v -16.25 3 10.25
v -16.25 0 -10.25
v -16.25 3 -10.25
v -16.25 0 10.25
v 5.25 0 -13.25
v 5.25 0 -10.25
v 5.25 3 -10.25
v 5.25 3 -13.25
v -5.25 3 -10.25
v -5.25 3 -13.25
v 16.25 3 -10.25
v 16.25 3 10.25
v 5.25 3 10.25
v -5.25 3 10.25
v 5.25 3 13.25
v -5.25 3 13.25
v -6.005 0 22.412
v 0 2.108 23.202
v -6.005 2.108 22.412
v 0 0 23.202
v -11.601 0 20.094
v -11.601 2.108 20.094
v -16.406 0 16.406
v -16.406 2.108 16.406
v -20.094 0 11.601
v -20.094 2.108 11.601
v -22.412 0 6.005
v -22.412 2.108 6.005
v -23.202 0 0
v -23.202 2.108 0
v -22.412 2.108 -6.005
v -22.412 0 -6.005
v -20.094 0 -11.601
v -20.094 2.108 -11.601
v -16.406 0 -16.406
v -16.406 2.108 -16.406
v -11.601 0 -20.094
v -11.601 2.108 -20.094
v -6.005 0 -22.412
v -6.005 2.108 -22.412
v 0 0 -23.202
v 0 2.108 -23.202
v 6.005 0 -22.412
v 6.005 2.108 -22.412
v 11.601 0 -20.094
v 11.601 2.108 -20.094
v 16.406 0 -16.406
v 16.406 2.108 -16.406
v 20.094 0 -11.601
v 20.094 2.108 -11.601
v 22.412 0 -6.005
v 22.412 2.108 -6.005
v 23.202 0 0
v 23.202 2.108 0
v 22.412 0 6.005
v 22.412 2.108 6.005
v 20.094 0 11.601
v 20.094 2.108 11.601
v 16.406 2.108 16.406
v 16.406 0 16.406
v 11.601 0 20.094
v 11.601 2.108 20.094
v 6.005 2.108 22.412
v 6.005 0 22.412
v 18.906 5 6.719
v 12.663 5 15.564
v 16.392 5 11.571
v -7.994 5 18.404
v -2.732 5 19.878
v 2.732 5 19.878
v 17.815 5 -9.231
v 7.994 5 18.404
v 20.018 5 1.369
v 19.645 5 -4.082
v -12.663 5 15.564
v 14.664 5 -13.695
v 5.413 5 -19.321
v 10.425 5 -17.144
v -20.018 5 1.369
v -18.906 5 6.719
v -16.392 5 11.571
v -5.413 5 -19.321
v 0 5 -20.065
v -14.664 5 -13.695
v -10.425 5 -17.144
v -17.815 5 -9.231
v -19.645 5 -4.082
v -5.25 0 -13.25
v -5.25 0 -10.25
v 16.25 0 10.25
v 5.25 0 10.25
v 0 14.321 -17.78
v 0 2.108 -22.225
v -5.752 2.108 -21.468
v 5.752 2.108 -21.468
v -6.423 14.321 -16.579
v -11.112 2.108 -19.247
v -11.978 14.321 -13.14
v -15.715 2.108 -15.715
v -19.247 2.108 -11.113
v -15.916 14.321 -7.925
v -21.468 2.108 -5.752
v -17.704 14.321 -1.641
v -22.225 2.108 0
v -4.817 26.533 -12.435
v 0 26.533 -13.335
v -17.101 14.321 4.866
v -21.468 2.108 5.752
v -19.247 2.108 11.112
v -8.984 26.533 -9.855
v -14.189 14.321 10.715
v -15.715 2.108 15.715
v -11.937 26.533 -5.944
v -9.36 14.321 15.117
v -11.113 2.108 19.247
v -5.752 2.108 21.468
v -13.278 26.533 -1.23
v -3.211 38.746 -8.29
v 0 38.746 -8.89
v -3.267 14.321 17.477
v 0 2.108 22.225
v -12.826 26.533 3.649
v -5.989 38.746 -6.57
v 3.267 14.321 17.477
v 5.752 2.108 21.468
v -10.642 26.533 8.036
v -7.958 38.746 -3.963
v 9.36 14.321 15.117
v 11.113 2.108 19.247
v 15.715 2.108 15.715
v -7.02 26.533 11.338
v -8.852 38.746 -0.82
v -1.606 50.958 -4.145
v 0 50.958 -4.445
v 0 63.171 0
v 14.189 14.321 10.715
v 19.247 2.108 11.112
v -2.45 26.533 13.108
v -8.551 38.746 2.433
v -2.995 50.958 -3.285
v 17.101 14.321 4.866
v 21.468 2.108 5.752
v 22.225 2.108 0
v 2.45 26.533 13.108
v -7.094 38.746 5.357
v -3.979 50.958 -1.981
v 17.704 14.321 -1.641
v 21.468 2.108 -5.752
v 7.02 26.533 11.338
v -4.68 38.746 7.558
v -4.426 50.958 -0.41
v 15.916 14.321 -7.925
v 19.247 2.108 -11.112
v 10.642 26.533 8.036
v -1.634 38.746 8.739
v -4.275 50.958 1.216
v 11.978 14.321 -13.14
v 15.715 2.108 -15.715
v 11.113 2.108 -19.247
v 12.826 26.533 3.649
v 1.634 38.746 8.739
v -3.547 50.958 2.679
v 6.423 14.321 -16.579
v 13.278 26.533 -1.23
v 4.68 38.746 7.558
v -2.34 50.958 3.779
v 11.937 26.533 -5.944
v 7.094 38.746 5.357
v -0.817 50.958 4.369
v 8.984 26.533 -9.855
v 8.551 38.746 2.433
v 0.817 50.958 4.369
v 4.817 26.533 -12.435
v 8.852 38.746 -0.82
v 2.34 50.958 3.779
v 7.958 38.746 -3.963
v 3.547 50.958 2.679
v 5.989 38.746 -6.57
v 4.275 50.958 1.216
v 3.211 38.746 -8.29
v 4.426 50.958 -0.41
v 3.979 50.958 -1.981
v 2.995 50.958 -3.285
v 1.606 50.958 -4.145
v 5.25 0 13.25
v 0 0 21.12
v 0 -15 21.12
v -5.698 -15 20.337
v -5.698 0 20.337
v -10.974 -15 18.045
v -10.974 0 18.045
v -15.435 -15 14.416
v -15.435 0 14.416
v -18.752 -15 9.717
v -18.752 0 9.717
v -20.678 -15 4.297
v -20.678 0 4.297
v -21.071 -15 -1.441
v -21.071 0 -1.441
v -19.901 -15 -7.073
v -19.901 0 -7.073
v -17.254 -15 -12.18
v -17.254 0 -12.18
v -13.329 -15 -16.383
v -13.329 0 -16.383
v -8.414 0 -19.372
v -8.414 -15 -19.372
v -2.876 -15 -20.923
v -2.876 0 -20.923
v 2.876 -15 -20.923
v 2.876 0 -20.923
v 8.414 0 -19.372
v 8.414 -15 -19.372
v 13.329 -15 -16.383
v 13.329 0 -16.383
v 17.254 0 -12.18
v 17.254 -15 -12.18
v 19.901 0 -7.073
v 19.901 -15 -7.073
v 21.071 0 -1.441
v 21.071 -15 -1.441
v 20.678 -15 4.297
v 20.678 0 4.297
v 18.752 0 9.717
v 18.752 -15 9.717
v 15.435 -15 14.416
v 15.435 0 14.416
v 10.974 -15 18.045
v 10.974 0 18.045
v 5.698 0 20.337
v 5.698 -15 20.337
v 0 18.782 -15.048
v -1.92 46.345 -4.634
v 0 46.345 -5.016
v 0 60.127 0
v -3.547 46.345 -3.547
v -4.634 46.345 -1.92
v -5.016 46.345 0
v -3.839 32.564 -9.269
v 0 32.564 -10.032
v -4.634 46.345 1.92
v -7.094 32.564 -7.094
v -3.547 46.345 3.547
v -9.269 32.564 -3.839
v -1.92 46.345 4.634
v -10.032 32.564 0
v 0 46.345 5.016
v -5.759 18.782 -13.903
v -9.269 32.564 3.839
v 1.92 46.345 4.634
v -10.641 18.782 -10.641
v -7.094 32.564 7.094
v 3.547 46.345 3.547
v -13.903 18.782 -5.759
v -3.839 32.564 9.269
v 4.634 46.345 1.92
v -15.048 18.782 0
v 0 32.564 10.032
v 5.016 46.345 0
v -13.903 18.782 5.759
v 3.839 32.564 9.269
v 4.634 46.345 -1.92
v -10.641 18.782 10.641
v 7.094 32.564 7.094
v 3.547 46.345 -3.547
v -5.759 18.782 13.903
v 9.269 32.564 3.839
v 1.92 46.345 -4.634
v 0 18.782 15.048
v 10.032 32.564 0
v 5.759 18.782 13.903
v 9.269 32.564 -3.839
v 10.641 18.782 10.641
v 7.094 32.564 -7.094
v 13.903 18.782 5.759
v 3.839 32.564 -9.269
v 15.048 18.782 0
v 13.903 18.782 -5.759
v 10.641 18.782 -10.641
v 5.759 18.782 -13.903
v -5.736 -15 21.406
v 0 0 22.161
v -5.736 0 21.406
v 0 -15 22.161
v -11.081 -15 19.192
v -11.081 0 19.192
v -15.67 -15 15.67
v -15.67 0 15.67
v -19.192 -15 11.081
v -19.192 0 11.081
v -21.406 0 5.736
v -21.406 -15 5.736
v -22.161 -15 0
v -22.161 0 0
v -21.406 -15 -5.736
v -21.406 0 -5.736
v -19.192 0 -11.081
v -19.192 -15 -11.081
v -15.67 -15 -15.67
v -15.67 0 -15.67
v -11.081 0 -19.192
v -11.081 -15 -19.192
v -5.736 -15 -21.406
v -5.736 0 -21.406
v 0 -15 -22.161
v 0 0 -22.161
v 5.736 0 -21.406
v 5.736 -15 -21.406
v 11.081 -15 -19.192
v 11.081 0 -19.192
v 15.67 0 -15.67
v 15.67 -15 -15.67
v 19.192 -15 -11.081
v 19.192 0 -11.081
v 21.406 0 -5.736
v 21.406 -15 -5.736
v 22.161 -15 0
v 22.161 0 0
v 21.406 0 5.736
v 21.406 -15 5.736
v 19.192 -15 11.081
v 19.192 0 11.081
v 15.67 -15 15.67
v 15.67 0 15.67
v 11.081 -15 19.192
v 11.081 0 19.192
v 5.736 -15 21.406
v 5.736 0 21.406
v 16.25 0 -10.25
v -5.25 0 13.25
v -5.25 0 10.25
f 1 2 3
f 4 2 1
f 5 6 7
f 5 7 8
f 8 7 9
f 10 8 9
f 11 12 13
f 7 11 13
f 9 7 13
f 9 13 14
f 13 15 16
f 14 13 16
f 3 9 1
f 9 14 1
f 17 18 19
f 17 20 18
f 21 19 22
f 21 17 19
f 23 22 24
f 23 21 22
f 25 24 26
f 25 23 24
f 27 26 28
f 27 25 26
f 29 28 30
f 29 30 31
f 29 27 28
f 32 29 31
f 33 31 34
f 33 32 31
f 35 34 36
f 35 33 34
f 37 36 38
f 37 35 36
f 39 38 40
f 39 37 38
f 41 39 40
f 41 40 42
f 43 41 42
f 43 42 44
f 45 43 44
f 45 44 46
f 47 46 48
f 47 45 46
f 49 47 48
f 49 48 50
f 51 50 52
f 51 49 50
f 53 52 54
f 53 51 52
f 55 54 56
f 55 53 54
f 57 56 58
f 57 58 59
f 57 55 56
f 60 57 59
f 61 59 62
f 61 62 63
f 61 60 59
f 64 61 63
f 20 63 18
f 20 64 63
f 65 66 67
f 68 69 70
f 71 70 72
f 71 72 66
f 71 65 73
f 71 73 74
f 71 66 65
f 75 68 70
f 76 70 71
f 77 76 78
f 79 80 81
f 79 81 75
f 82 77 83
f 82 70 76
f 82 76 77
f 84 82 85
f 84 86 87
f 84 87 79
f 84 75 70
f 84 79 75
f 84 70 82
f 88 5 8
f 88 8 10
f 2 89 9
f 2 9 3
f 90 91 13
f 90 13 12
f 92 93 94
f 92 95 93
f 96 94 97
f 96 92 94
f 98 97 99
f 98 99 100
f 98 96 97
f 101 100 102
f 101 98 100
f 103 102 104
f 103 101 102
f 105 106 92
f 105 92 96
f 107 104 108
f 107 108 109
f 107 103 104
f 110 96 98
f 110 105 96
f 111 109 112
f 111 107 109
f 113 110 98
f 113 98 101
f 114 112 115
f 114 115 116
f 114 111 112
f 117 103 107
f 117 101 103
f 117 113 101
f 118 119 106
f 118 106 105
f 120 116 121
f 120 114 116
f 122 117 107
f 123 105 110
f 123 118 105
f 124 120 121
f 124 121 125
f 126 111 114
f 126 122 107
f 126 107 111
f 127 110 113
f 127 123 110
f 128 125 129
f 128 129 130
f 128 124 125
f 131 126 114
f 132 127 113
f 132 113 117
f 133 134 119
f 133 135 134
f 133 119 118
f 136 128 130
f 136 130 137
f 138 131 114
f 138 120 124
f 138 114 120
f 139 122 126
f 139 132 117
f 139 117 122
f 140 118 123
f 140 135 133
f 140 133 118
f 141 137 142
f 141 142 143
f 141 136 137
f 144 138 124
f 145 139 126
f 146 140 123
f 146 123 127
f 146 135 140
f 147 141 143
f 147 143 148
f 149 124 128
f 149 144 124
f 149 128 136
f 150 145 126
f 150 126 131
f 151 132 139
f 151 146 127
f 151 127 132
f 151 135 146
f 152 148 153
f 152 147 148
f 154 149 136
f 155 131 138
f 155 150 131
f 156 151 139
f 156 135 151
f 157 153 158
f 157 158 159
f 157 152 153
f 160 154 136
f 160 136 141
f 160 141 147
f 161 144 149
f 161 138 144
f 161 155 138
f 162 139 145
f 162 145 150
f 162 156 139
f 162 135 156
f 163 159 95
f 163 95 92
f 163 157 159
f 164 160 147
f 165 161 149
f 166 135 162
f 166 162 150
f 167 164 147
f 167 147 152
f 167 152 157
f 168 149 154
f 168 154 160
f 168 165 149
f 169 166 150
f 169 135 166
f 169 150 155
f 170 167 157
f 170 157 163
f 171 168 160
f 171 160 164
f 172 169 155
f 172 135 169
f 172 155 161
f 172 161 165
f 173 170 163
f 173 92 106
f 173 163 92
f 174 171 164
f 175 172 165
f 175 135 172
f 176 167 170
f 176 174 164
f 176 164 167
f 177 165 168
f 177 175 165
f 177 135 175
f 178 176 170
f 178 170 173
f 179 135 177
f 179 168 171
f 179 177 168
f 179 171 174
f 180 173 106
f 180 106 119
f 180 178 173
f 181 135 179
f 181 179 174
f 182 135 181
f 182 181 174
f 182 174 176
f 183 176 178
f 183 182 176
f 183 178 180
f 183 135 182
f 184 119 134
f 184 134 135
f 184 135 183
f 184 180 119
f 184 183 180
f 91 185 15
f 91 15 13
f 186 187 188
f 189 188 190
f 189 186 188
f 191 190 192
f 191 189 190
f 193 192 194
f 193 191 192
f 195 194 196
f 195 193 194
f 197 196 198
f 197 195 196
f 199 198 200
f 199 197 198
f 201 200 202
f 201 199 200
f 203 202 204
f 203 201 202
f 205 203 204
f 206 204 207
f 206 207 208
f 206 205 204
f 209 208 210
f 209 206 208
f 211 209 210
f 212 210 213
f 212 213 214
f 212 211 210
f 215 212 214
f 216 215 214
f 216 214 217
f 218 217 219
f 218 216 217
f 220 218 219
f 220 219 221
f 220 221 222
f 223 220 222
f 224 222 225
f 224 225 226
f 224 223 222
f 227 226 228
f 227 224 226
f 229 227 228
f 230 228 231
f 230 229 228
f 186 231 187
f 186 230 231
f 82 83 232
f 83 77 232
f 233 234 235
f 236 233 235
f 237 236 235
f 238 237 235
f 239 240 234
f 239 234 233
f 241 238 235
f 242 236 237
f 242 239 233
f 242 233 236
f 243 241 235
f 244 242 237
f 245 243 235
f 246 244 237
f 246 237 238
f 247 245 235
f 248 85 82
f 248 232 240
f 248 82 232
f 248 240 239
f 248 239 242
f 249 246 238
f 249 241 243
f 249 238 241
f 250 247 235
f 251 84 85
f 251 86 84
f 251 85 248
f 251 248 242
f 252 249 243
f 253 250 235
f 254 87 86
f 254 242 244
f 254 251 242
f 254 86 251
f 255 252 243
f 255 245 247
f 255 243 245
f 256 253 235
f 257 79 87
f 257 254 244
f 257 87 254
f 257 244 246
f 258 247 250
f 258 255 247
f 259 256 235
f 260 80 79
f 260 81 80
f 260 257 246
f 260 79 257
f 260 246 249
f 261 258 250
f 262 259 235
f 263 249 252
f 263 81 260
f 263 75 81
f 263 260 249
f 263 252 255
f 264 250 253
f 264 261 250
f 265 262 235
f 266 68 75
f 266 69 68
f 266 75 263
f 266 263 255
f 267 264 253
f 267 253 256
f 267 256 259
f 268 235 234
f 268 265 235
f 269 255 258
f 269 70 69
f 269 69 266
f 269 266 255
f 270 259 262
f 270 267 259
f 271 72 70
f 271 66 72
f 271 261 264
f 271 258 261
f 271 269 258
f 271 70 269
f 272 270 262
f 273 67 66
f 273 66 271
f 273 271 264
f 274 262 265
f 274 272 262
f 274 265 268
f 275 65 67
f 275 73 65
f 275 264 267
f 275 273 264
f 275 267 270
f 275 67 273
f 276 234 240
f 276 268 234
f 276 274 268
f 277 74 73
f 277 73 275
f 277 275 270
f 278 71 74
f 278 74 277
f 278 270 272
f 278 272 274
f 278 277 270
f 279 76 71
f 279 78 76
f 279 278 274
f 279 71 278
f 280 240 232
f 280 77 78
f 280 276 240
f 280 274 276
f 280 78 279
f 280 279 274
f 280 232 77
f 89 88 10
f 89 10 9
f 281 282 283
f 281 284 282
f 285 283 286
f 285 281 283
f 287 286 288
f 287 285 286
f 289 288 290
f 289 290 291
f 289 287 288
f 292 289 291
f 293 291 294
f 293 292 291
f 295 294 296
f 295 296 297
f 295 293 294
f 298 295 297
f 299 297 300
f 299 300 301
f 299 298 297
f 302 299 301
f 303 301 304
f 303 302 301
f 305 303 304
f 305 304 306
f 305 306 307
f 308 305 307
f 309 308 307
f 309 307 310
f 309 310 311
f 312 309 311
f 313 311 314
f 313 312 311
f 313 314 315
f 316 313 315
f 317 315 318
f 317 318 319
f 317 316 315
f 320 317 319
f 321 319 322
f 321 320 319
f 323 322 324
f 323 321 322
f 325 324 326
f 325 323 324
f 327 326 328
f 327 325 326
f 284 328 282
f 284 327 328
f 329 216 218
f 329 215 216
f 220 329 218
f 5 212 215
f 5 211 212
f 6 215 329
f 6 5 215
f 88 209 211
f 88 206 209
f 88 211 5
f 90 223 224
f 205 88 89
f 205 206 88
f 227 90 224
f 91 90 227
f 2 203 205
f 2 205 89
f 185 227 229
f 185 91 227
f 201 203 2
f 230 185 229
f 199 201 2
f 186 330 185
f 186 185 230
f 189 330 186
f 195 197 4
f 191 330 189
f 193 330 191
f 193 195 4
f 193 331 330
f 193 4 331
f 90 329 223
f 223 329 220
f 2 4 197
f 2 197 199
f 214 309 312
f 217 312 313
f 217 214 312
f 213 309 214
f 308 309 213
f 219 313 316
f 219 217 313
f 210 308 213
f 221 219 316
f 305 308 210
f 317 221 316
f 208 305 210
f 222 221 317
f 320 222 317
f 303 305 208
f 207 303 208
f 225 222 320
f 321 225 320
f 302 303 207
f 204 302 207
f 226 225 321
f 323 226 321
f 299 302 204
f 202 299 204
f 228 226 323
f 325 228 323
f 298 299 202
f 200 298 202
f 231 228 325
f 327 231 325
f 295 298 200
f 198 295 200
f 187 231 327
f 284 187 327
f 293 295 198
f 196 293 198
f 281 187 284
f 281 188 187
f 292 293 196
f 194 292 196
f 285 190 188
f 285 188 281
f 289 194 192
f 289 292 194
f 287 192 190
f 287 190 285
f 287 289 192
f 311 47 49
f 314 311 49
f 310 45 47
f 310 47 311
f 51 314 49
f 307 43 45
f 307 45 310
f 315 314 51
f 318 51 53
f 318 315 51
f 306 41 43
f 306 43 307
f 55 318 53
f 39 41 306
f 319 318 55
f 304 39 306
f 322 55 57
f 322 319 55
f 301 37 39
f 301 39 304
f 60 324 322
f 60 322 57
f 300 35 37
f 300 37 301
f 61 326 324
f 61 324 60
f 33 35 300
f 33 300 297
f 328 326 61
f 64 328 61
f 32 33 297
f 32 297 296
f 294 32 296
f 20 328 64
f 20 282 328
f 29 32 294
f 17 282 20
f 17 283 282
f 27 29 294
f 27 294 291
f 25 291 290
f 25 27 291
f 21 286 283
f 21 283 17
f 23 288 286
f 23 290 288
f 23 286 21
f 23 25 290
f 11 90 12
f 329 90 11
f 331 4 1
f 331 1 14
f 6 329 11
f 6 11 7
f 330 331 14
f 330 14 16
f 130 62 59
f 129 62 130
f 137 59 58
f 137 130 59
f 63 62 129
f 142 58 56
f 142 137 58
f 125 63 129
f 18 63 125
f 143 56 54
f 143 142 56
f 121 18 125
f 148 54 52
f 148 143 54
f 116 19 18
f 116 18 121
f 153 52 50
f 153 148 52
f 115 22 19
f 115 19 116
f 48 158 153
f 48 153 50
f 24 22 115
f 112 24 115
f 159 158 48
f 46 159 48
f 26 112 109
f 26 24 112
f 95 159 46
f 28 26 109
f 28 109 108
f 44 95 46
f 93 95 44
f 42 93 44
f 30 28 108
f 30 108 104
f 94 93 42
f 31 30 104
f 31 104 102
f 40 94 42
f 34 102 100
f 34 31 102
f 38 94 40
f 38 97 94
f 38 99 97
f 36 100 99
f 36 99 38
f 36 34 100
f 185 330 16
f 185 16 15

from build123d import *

# Parameters (mm, degrees)
CUT_EXTRUDE1_DEPTH = 3


with BuildPart() as part:
    # Sketch1 → Revolve1 (revolve)
    with BuildSketch(Plane.XY, mode=Mode.PRIVATE) as revolve1_sk:
        Polygon((0, 0), (-22.225, 0), (-22.225, 2.1082), (0, 63.170885647), (0, 60.127205267), (-20.064661815, 5), (0, 5), align=None)
    revolve(revolve1_sk.sketch.rotate(Axis((0, 0, 0), (0, 1, 0)), 270), axis=Axis((0, 0, 0), (0, 1, 0)))

    # Sketch9 → Revolve3 (revolve)
    with BuildSketch(Plane.XY, mode=Mode.PRIVATE) as revolve3_sk:
        Polygon((-22.1611, 0), (-22.1611, -15), (-21.1201, -15), (-21.1201, 2.1082), (-23.2021, 2.1082), (-23.2021, 0), align=None)
    revolve(revolve3_sk.sketch.rotate(Axis((0, 63.536813388, 0), (0, -1, 0)), 270), axis=Axis((0, 63.536813388, 0), (0, -1, 0)))

    # Sketch10 → Cut-Extrude1 (cut)
    with BuildSketch(Plane.XZ):
        Polygon((-5.25, 13.25), (5.25, 13.25), (5.25, 10.25), (16.25, 10.25), (16.25, -10.25), (5.25, -10.25), (5.25, -13.25), (-5.25, -13.25), (-5.25, -10.25), (-16.25, -10.25), (-16.25, 10.25), (-5.25, 10.25), align=None)
    extrude(amount=-CUT_EXTRUDE1_DEPTH, mode=Mode.SUBTRACT)


solid = part.part
